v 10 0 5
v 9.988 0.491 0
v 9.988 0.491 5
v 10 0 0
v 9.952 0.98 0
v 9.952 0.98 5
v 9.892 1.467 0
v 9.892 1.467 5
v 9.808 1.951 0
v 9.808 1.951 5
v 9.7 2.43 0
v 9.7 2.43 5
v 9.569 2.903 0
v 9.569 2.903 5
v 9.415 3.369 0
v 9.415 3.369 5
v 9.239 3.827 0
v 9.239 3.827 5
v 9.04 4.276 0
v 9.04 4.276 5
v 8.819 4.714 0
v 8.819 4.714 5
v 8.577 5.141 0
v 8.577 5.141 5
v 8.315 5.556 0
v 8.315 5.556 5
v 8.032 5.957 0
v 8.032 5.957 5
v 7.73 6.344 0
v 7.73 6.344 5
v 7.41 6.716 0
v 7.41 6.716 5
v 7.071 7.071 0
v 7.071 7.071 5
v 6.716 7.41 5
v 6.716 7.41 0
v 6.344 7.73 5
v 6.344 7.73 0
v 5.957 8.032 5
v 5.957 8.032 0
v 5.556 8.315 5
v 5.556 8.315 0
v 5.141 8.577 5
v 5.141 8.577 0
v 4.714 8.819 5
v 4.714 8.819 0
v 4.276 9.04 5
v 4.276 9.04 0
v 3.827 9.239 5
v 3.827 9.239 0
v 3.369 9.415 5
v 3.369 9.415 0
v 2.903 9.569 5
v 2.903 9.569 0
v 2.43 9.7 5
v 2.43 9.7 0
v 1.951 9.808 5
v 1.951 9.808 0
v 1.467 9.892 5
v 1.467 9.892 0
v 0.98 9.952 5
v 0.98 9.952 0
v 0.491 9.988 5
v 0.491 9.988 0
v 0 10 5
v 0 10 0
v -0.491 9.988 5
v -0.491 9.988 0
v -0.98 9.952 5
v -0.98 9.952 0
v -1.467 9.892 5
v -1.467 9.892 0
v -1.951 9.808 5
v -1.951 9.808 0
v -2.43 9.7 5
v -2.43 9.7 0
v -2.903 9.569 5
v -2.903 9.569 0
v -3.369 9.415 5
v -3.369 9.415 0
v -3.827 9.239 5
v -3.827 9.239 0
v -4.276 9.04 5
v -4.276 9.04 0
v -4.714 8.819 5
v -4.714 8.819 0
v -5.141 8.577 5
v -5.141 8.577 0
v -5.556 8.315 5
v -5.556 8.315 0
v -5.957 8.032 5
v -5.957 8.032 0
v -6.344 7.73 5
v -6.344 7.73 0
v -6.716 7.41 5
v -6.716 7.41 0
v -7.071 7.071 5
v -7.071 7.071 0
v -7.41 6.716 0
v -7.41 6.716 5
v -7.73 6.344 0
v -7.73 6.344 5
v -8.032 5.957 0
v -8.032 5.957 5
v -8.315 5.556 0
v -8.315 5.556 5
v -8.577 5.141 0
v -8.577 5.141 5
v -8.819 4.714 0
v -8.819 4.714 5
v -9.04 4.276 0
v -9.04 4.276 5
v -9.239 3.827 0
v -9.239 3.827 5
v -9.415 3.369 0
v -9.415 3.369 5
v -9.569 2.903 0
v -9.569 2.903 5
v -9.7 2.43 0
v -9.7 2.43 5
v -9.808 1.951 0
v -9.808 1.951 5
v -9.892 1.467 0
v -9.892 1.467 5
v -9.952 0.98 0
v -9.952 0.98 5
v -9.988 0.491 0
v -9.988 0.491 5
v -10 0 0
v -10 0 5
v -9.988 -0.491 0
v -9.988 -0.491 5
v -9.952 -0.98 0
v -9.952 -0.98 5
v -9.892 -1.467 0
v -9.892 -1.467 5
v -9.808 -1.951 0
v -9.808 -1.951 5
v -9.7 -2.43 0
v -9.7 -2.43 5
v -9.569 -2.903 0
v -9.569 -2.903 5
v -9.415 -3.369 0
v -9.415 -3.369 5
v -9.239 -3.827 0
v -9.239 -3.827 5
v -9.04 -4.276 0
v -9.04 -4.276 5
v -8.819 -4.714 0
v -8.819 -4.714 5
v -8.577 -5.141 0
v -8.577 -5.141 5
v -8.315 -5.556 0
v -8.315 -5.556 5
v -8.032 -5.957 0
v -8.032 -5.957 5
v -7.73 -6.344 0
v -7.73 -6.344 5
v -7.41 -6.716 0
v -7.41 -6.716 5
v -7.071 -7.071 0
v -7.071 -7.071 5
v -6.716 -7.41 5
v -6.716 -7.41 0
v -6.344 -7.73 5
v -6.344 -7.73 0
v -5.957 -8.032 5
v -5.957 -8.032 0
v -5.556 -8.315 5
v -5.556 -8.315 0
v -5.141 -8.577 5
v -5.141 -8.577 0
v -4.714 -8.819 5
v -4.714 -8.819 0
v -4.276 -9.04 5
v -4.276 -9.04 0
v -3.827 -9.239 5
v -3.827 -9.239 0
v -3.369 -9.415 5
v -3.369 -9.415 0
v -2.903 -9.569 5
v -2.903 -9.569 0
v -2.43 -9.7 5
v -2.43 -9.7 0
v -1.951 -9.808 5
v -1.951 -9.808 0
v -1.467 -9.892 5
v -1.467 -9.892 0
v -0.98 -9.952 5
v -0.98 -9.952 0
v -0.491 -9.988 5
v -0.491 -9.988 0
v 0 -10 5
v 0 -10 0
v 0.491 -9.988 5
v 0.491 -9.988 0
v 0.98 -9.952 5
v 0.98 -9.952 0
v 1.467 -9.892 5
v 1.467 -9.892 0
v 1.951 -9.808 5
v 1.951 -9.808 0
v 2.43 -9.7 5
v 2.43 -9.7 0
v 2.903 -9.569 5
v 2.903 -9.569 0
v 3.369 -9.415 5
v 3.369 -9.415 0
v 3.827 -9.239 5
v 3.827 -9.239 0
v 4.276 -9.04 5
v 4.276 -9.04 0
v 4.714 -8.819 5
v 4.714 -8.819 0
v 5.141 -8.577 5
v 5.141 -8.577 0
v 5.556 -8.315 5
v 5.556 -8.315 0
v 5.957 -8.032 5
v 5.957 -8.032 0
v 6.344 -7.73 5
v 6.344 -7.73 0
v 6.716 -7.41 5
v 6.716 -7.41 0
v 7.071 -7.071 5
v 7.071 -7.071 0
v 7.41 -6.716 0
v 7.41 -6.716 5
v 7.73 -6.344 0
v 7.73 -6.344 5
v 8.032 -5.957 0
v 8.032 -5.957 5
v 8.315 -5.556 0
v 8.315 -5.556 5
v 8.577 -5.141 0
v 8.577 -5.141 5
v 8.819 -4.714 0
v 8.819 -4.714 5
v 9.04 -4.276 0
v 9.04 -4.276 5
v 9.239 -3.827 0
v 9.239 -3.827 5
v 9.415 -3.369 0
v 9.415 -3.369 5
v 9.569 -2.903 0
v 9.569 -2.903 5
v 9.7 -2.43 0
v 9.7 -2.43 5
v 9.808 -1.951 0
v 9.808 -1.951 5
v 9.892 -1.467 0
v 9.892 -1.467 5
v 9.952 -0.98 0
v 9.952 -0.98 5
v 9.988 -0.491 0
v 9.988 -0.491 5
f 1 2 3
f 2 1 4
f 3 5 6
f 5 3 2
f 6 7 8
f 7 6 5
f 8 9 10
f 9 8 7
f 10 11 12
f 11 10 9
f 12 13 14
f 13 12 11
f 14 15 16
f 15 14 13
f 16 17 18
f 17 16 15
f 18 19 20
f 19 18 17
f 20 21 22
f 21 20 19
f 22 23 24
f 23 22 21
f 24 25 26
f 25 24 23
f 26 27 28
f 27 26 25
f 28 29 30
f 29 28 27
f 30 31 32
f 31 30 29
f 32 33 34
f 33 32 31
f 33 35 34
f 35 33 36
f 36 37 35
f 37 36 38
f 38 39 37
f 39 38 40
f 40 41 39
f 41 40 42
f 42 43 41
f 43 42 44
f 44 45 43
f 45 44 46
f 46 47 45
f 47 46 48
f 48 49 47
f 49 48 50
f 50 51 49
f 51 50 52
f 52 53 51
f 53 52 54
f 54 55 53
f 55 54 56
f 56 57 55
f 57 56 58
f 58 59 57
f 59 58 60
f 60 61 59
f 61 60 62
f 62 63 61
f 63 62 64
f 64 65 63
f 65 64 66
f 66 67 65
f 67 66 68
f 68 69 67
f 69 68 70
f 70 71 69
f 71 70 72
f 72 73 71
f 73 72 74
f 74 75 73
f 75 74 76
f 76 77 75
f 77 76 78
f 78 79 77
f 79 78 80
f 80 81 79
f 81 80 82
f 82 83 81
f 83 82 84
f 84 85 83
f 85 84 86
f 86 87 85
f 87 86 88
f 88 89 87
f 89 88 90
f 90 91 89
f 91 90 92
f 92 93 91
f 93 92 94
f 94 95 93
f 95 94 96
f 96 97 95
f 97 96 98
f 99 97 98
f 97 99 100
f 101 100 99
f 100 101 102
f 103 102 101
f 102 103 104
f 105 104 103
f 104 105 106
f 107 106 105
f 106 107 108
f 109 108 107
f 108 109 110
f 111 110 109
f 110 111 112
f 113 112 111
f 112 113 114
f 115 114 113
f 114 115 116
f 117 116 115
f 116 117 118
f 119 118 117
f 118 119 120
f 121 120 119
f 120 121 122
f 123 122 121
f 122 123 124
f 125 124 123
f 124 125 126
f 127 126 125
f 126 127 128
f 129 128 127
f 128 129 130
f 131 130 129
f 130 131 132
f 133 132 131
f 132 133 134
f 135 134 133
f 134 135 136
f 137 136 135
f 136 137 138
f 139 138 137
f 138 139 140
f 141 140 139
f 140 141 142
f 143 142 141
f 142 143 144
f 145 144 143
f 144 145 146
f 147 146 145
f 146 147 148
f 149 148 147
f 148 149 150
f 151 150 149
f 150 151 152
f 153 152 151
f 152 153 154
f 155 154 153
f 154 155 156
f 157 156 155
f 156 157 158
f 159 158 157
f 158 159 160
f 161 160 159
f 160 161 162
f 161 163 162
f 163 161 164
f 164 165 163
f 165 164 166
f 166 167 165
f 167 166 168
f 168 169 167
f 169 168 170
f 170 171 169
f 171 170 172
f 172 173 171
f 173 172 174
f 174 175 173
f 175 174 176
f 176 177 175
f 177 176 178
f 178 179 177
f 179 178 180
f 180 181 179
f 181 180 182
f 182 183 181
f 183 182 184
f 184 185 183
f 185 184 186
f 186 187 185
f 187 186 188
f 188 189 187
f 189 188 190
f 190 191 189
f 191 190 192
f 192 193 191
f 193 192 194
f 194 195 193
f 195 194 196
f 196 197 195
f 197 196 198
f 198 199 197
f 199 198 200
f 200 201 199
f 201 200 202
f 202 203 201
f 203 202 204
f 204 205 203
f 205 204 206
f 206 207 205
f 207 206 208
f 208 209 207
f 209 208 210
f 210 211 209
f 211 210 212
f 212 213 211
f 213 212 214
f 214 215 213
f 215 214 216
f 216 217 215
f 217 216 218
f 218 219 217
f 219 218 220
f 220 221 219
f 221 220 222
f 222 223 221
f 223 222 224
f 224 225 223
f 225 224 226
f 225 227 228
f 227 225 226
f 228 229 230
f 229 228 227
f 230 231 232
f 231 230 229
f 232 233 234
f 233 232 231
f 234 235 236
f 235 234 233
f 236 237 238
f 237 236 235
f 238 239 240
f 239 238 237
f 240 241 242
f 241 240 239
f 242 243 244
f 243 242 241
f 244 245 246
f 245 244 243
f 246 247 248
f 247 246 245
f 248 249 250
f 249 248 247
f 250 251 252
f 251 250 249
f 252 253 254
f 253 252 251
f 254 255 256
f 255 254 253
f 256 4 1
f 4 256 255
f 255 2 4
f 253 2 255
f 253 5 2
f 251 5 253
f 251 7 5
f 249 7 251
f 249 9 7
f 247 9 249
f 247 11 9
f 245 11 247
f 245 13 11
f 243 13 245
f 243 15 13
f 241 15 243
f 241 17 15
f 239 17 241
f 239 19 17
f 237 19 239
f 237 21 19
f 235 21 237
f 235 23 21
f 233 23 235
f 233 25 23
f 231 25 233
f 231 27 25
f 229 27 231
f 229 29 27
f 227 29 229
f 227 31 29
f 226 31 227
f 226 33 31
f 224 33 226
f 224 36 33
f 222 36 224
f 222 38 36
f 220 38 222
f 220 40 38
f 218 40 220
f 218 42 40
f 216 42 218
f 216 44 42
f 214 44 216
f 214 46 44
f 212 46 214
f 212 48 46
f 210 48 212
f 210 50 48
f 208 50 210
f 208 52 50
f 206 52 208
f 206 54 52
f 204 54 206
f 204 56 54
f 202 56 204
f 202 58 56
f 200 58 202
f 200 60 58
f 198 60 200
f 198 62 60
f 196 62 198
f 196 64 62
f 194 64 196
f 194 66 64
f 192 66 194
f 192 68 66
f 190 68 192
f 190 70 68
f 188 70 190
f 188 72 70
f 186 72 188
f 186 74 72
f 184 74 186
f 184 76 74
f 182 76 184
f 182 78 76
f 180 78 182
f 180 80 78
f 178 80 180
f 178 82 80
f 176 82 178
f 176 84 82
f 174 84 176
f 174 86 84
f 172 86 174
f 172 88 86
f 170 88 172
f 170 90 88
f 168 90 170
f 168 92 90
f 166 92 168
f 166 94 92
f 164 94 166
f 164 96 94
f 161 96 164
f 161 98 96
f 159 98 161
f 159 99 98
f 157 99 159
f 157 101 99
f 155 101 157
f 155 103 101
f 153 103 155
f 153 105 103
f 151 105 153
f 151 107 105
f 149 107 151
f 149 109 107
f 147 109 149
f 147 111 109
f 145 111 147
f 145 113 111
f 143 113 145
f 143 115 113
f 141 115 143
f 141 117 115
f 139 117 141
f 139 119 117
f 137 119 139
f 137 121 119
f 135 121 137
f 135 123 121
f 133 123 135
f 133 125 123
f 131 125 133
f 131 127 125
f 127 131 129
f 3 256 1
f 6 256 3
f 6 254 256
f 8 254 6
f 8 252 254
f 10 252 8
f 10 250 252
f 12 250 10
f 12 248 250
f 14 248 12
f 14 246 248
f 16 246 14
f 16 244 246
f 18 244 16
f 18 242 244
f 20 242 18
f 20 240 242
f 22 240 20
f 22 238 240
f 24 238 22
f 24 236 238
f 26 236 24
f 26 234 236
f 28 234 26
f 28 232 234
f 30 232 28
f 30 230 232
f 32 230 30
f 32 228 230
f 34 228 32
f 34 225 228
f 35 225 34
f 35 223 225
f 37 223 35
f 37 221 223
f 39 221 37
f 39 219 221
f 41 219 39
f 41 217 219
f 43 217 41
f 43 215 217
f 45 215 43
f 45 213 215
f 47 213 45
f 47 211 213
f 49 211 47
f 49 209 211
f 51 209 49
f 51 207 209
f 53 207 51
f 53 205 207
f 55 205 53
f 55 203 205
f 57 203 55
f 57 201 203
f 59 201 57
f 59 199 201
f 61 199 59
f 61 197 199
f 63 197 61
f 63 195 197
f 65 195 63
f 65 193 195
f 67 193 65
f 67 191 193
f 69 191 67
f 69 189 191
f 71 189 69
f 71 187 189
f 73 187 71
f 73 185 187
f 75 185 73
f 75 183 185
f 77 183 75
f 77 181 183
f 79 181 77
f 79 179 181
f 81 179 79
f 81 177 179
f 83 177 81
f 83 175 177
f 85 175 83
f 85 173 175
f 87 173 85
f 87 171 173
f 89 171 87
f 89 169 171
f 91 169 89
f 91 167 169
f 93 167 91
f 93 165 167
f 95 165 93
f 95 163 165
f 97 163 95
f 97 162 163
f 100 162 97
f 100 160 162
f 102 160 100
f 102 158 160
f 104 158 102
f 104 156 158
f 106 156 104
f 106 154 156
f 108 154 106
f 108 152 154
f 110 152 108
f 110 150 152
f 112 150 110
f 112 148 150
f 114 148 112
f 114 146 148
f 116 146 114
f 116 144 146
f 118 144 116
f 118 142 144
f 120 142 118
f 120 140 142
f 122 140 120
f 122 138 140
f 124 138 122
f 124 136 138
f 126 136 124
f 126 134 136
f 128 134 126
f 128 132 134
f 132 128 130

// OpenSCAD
$fn=128;

magnet_d = 20;
magnet_h = 5;

difference() {
    cylinder(d=magnet_d, h=magnet_h);
}
